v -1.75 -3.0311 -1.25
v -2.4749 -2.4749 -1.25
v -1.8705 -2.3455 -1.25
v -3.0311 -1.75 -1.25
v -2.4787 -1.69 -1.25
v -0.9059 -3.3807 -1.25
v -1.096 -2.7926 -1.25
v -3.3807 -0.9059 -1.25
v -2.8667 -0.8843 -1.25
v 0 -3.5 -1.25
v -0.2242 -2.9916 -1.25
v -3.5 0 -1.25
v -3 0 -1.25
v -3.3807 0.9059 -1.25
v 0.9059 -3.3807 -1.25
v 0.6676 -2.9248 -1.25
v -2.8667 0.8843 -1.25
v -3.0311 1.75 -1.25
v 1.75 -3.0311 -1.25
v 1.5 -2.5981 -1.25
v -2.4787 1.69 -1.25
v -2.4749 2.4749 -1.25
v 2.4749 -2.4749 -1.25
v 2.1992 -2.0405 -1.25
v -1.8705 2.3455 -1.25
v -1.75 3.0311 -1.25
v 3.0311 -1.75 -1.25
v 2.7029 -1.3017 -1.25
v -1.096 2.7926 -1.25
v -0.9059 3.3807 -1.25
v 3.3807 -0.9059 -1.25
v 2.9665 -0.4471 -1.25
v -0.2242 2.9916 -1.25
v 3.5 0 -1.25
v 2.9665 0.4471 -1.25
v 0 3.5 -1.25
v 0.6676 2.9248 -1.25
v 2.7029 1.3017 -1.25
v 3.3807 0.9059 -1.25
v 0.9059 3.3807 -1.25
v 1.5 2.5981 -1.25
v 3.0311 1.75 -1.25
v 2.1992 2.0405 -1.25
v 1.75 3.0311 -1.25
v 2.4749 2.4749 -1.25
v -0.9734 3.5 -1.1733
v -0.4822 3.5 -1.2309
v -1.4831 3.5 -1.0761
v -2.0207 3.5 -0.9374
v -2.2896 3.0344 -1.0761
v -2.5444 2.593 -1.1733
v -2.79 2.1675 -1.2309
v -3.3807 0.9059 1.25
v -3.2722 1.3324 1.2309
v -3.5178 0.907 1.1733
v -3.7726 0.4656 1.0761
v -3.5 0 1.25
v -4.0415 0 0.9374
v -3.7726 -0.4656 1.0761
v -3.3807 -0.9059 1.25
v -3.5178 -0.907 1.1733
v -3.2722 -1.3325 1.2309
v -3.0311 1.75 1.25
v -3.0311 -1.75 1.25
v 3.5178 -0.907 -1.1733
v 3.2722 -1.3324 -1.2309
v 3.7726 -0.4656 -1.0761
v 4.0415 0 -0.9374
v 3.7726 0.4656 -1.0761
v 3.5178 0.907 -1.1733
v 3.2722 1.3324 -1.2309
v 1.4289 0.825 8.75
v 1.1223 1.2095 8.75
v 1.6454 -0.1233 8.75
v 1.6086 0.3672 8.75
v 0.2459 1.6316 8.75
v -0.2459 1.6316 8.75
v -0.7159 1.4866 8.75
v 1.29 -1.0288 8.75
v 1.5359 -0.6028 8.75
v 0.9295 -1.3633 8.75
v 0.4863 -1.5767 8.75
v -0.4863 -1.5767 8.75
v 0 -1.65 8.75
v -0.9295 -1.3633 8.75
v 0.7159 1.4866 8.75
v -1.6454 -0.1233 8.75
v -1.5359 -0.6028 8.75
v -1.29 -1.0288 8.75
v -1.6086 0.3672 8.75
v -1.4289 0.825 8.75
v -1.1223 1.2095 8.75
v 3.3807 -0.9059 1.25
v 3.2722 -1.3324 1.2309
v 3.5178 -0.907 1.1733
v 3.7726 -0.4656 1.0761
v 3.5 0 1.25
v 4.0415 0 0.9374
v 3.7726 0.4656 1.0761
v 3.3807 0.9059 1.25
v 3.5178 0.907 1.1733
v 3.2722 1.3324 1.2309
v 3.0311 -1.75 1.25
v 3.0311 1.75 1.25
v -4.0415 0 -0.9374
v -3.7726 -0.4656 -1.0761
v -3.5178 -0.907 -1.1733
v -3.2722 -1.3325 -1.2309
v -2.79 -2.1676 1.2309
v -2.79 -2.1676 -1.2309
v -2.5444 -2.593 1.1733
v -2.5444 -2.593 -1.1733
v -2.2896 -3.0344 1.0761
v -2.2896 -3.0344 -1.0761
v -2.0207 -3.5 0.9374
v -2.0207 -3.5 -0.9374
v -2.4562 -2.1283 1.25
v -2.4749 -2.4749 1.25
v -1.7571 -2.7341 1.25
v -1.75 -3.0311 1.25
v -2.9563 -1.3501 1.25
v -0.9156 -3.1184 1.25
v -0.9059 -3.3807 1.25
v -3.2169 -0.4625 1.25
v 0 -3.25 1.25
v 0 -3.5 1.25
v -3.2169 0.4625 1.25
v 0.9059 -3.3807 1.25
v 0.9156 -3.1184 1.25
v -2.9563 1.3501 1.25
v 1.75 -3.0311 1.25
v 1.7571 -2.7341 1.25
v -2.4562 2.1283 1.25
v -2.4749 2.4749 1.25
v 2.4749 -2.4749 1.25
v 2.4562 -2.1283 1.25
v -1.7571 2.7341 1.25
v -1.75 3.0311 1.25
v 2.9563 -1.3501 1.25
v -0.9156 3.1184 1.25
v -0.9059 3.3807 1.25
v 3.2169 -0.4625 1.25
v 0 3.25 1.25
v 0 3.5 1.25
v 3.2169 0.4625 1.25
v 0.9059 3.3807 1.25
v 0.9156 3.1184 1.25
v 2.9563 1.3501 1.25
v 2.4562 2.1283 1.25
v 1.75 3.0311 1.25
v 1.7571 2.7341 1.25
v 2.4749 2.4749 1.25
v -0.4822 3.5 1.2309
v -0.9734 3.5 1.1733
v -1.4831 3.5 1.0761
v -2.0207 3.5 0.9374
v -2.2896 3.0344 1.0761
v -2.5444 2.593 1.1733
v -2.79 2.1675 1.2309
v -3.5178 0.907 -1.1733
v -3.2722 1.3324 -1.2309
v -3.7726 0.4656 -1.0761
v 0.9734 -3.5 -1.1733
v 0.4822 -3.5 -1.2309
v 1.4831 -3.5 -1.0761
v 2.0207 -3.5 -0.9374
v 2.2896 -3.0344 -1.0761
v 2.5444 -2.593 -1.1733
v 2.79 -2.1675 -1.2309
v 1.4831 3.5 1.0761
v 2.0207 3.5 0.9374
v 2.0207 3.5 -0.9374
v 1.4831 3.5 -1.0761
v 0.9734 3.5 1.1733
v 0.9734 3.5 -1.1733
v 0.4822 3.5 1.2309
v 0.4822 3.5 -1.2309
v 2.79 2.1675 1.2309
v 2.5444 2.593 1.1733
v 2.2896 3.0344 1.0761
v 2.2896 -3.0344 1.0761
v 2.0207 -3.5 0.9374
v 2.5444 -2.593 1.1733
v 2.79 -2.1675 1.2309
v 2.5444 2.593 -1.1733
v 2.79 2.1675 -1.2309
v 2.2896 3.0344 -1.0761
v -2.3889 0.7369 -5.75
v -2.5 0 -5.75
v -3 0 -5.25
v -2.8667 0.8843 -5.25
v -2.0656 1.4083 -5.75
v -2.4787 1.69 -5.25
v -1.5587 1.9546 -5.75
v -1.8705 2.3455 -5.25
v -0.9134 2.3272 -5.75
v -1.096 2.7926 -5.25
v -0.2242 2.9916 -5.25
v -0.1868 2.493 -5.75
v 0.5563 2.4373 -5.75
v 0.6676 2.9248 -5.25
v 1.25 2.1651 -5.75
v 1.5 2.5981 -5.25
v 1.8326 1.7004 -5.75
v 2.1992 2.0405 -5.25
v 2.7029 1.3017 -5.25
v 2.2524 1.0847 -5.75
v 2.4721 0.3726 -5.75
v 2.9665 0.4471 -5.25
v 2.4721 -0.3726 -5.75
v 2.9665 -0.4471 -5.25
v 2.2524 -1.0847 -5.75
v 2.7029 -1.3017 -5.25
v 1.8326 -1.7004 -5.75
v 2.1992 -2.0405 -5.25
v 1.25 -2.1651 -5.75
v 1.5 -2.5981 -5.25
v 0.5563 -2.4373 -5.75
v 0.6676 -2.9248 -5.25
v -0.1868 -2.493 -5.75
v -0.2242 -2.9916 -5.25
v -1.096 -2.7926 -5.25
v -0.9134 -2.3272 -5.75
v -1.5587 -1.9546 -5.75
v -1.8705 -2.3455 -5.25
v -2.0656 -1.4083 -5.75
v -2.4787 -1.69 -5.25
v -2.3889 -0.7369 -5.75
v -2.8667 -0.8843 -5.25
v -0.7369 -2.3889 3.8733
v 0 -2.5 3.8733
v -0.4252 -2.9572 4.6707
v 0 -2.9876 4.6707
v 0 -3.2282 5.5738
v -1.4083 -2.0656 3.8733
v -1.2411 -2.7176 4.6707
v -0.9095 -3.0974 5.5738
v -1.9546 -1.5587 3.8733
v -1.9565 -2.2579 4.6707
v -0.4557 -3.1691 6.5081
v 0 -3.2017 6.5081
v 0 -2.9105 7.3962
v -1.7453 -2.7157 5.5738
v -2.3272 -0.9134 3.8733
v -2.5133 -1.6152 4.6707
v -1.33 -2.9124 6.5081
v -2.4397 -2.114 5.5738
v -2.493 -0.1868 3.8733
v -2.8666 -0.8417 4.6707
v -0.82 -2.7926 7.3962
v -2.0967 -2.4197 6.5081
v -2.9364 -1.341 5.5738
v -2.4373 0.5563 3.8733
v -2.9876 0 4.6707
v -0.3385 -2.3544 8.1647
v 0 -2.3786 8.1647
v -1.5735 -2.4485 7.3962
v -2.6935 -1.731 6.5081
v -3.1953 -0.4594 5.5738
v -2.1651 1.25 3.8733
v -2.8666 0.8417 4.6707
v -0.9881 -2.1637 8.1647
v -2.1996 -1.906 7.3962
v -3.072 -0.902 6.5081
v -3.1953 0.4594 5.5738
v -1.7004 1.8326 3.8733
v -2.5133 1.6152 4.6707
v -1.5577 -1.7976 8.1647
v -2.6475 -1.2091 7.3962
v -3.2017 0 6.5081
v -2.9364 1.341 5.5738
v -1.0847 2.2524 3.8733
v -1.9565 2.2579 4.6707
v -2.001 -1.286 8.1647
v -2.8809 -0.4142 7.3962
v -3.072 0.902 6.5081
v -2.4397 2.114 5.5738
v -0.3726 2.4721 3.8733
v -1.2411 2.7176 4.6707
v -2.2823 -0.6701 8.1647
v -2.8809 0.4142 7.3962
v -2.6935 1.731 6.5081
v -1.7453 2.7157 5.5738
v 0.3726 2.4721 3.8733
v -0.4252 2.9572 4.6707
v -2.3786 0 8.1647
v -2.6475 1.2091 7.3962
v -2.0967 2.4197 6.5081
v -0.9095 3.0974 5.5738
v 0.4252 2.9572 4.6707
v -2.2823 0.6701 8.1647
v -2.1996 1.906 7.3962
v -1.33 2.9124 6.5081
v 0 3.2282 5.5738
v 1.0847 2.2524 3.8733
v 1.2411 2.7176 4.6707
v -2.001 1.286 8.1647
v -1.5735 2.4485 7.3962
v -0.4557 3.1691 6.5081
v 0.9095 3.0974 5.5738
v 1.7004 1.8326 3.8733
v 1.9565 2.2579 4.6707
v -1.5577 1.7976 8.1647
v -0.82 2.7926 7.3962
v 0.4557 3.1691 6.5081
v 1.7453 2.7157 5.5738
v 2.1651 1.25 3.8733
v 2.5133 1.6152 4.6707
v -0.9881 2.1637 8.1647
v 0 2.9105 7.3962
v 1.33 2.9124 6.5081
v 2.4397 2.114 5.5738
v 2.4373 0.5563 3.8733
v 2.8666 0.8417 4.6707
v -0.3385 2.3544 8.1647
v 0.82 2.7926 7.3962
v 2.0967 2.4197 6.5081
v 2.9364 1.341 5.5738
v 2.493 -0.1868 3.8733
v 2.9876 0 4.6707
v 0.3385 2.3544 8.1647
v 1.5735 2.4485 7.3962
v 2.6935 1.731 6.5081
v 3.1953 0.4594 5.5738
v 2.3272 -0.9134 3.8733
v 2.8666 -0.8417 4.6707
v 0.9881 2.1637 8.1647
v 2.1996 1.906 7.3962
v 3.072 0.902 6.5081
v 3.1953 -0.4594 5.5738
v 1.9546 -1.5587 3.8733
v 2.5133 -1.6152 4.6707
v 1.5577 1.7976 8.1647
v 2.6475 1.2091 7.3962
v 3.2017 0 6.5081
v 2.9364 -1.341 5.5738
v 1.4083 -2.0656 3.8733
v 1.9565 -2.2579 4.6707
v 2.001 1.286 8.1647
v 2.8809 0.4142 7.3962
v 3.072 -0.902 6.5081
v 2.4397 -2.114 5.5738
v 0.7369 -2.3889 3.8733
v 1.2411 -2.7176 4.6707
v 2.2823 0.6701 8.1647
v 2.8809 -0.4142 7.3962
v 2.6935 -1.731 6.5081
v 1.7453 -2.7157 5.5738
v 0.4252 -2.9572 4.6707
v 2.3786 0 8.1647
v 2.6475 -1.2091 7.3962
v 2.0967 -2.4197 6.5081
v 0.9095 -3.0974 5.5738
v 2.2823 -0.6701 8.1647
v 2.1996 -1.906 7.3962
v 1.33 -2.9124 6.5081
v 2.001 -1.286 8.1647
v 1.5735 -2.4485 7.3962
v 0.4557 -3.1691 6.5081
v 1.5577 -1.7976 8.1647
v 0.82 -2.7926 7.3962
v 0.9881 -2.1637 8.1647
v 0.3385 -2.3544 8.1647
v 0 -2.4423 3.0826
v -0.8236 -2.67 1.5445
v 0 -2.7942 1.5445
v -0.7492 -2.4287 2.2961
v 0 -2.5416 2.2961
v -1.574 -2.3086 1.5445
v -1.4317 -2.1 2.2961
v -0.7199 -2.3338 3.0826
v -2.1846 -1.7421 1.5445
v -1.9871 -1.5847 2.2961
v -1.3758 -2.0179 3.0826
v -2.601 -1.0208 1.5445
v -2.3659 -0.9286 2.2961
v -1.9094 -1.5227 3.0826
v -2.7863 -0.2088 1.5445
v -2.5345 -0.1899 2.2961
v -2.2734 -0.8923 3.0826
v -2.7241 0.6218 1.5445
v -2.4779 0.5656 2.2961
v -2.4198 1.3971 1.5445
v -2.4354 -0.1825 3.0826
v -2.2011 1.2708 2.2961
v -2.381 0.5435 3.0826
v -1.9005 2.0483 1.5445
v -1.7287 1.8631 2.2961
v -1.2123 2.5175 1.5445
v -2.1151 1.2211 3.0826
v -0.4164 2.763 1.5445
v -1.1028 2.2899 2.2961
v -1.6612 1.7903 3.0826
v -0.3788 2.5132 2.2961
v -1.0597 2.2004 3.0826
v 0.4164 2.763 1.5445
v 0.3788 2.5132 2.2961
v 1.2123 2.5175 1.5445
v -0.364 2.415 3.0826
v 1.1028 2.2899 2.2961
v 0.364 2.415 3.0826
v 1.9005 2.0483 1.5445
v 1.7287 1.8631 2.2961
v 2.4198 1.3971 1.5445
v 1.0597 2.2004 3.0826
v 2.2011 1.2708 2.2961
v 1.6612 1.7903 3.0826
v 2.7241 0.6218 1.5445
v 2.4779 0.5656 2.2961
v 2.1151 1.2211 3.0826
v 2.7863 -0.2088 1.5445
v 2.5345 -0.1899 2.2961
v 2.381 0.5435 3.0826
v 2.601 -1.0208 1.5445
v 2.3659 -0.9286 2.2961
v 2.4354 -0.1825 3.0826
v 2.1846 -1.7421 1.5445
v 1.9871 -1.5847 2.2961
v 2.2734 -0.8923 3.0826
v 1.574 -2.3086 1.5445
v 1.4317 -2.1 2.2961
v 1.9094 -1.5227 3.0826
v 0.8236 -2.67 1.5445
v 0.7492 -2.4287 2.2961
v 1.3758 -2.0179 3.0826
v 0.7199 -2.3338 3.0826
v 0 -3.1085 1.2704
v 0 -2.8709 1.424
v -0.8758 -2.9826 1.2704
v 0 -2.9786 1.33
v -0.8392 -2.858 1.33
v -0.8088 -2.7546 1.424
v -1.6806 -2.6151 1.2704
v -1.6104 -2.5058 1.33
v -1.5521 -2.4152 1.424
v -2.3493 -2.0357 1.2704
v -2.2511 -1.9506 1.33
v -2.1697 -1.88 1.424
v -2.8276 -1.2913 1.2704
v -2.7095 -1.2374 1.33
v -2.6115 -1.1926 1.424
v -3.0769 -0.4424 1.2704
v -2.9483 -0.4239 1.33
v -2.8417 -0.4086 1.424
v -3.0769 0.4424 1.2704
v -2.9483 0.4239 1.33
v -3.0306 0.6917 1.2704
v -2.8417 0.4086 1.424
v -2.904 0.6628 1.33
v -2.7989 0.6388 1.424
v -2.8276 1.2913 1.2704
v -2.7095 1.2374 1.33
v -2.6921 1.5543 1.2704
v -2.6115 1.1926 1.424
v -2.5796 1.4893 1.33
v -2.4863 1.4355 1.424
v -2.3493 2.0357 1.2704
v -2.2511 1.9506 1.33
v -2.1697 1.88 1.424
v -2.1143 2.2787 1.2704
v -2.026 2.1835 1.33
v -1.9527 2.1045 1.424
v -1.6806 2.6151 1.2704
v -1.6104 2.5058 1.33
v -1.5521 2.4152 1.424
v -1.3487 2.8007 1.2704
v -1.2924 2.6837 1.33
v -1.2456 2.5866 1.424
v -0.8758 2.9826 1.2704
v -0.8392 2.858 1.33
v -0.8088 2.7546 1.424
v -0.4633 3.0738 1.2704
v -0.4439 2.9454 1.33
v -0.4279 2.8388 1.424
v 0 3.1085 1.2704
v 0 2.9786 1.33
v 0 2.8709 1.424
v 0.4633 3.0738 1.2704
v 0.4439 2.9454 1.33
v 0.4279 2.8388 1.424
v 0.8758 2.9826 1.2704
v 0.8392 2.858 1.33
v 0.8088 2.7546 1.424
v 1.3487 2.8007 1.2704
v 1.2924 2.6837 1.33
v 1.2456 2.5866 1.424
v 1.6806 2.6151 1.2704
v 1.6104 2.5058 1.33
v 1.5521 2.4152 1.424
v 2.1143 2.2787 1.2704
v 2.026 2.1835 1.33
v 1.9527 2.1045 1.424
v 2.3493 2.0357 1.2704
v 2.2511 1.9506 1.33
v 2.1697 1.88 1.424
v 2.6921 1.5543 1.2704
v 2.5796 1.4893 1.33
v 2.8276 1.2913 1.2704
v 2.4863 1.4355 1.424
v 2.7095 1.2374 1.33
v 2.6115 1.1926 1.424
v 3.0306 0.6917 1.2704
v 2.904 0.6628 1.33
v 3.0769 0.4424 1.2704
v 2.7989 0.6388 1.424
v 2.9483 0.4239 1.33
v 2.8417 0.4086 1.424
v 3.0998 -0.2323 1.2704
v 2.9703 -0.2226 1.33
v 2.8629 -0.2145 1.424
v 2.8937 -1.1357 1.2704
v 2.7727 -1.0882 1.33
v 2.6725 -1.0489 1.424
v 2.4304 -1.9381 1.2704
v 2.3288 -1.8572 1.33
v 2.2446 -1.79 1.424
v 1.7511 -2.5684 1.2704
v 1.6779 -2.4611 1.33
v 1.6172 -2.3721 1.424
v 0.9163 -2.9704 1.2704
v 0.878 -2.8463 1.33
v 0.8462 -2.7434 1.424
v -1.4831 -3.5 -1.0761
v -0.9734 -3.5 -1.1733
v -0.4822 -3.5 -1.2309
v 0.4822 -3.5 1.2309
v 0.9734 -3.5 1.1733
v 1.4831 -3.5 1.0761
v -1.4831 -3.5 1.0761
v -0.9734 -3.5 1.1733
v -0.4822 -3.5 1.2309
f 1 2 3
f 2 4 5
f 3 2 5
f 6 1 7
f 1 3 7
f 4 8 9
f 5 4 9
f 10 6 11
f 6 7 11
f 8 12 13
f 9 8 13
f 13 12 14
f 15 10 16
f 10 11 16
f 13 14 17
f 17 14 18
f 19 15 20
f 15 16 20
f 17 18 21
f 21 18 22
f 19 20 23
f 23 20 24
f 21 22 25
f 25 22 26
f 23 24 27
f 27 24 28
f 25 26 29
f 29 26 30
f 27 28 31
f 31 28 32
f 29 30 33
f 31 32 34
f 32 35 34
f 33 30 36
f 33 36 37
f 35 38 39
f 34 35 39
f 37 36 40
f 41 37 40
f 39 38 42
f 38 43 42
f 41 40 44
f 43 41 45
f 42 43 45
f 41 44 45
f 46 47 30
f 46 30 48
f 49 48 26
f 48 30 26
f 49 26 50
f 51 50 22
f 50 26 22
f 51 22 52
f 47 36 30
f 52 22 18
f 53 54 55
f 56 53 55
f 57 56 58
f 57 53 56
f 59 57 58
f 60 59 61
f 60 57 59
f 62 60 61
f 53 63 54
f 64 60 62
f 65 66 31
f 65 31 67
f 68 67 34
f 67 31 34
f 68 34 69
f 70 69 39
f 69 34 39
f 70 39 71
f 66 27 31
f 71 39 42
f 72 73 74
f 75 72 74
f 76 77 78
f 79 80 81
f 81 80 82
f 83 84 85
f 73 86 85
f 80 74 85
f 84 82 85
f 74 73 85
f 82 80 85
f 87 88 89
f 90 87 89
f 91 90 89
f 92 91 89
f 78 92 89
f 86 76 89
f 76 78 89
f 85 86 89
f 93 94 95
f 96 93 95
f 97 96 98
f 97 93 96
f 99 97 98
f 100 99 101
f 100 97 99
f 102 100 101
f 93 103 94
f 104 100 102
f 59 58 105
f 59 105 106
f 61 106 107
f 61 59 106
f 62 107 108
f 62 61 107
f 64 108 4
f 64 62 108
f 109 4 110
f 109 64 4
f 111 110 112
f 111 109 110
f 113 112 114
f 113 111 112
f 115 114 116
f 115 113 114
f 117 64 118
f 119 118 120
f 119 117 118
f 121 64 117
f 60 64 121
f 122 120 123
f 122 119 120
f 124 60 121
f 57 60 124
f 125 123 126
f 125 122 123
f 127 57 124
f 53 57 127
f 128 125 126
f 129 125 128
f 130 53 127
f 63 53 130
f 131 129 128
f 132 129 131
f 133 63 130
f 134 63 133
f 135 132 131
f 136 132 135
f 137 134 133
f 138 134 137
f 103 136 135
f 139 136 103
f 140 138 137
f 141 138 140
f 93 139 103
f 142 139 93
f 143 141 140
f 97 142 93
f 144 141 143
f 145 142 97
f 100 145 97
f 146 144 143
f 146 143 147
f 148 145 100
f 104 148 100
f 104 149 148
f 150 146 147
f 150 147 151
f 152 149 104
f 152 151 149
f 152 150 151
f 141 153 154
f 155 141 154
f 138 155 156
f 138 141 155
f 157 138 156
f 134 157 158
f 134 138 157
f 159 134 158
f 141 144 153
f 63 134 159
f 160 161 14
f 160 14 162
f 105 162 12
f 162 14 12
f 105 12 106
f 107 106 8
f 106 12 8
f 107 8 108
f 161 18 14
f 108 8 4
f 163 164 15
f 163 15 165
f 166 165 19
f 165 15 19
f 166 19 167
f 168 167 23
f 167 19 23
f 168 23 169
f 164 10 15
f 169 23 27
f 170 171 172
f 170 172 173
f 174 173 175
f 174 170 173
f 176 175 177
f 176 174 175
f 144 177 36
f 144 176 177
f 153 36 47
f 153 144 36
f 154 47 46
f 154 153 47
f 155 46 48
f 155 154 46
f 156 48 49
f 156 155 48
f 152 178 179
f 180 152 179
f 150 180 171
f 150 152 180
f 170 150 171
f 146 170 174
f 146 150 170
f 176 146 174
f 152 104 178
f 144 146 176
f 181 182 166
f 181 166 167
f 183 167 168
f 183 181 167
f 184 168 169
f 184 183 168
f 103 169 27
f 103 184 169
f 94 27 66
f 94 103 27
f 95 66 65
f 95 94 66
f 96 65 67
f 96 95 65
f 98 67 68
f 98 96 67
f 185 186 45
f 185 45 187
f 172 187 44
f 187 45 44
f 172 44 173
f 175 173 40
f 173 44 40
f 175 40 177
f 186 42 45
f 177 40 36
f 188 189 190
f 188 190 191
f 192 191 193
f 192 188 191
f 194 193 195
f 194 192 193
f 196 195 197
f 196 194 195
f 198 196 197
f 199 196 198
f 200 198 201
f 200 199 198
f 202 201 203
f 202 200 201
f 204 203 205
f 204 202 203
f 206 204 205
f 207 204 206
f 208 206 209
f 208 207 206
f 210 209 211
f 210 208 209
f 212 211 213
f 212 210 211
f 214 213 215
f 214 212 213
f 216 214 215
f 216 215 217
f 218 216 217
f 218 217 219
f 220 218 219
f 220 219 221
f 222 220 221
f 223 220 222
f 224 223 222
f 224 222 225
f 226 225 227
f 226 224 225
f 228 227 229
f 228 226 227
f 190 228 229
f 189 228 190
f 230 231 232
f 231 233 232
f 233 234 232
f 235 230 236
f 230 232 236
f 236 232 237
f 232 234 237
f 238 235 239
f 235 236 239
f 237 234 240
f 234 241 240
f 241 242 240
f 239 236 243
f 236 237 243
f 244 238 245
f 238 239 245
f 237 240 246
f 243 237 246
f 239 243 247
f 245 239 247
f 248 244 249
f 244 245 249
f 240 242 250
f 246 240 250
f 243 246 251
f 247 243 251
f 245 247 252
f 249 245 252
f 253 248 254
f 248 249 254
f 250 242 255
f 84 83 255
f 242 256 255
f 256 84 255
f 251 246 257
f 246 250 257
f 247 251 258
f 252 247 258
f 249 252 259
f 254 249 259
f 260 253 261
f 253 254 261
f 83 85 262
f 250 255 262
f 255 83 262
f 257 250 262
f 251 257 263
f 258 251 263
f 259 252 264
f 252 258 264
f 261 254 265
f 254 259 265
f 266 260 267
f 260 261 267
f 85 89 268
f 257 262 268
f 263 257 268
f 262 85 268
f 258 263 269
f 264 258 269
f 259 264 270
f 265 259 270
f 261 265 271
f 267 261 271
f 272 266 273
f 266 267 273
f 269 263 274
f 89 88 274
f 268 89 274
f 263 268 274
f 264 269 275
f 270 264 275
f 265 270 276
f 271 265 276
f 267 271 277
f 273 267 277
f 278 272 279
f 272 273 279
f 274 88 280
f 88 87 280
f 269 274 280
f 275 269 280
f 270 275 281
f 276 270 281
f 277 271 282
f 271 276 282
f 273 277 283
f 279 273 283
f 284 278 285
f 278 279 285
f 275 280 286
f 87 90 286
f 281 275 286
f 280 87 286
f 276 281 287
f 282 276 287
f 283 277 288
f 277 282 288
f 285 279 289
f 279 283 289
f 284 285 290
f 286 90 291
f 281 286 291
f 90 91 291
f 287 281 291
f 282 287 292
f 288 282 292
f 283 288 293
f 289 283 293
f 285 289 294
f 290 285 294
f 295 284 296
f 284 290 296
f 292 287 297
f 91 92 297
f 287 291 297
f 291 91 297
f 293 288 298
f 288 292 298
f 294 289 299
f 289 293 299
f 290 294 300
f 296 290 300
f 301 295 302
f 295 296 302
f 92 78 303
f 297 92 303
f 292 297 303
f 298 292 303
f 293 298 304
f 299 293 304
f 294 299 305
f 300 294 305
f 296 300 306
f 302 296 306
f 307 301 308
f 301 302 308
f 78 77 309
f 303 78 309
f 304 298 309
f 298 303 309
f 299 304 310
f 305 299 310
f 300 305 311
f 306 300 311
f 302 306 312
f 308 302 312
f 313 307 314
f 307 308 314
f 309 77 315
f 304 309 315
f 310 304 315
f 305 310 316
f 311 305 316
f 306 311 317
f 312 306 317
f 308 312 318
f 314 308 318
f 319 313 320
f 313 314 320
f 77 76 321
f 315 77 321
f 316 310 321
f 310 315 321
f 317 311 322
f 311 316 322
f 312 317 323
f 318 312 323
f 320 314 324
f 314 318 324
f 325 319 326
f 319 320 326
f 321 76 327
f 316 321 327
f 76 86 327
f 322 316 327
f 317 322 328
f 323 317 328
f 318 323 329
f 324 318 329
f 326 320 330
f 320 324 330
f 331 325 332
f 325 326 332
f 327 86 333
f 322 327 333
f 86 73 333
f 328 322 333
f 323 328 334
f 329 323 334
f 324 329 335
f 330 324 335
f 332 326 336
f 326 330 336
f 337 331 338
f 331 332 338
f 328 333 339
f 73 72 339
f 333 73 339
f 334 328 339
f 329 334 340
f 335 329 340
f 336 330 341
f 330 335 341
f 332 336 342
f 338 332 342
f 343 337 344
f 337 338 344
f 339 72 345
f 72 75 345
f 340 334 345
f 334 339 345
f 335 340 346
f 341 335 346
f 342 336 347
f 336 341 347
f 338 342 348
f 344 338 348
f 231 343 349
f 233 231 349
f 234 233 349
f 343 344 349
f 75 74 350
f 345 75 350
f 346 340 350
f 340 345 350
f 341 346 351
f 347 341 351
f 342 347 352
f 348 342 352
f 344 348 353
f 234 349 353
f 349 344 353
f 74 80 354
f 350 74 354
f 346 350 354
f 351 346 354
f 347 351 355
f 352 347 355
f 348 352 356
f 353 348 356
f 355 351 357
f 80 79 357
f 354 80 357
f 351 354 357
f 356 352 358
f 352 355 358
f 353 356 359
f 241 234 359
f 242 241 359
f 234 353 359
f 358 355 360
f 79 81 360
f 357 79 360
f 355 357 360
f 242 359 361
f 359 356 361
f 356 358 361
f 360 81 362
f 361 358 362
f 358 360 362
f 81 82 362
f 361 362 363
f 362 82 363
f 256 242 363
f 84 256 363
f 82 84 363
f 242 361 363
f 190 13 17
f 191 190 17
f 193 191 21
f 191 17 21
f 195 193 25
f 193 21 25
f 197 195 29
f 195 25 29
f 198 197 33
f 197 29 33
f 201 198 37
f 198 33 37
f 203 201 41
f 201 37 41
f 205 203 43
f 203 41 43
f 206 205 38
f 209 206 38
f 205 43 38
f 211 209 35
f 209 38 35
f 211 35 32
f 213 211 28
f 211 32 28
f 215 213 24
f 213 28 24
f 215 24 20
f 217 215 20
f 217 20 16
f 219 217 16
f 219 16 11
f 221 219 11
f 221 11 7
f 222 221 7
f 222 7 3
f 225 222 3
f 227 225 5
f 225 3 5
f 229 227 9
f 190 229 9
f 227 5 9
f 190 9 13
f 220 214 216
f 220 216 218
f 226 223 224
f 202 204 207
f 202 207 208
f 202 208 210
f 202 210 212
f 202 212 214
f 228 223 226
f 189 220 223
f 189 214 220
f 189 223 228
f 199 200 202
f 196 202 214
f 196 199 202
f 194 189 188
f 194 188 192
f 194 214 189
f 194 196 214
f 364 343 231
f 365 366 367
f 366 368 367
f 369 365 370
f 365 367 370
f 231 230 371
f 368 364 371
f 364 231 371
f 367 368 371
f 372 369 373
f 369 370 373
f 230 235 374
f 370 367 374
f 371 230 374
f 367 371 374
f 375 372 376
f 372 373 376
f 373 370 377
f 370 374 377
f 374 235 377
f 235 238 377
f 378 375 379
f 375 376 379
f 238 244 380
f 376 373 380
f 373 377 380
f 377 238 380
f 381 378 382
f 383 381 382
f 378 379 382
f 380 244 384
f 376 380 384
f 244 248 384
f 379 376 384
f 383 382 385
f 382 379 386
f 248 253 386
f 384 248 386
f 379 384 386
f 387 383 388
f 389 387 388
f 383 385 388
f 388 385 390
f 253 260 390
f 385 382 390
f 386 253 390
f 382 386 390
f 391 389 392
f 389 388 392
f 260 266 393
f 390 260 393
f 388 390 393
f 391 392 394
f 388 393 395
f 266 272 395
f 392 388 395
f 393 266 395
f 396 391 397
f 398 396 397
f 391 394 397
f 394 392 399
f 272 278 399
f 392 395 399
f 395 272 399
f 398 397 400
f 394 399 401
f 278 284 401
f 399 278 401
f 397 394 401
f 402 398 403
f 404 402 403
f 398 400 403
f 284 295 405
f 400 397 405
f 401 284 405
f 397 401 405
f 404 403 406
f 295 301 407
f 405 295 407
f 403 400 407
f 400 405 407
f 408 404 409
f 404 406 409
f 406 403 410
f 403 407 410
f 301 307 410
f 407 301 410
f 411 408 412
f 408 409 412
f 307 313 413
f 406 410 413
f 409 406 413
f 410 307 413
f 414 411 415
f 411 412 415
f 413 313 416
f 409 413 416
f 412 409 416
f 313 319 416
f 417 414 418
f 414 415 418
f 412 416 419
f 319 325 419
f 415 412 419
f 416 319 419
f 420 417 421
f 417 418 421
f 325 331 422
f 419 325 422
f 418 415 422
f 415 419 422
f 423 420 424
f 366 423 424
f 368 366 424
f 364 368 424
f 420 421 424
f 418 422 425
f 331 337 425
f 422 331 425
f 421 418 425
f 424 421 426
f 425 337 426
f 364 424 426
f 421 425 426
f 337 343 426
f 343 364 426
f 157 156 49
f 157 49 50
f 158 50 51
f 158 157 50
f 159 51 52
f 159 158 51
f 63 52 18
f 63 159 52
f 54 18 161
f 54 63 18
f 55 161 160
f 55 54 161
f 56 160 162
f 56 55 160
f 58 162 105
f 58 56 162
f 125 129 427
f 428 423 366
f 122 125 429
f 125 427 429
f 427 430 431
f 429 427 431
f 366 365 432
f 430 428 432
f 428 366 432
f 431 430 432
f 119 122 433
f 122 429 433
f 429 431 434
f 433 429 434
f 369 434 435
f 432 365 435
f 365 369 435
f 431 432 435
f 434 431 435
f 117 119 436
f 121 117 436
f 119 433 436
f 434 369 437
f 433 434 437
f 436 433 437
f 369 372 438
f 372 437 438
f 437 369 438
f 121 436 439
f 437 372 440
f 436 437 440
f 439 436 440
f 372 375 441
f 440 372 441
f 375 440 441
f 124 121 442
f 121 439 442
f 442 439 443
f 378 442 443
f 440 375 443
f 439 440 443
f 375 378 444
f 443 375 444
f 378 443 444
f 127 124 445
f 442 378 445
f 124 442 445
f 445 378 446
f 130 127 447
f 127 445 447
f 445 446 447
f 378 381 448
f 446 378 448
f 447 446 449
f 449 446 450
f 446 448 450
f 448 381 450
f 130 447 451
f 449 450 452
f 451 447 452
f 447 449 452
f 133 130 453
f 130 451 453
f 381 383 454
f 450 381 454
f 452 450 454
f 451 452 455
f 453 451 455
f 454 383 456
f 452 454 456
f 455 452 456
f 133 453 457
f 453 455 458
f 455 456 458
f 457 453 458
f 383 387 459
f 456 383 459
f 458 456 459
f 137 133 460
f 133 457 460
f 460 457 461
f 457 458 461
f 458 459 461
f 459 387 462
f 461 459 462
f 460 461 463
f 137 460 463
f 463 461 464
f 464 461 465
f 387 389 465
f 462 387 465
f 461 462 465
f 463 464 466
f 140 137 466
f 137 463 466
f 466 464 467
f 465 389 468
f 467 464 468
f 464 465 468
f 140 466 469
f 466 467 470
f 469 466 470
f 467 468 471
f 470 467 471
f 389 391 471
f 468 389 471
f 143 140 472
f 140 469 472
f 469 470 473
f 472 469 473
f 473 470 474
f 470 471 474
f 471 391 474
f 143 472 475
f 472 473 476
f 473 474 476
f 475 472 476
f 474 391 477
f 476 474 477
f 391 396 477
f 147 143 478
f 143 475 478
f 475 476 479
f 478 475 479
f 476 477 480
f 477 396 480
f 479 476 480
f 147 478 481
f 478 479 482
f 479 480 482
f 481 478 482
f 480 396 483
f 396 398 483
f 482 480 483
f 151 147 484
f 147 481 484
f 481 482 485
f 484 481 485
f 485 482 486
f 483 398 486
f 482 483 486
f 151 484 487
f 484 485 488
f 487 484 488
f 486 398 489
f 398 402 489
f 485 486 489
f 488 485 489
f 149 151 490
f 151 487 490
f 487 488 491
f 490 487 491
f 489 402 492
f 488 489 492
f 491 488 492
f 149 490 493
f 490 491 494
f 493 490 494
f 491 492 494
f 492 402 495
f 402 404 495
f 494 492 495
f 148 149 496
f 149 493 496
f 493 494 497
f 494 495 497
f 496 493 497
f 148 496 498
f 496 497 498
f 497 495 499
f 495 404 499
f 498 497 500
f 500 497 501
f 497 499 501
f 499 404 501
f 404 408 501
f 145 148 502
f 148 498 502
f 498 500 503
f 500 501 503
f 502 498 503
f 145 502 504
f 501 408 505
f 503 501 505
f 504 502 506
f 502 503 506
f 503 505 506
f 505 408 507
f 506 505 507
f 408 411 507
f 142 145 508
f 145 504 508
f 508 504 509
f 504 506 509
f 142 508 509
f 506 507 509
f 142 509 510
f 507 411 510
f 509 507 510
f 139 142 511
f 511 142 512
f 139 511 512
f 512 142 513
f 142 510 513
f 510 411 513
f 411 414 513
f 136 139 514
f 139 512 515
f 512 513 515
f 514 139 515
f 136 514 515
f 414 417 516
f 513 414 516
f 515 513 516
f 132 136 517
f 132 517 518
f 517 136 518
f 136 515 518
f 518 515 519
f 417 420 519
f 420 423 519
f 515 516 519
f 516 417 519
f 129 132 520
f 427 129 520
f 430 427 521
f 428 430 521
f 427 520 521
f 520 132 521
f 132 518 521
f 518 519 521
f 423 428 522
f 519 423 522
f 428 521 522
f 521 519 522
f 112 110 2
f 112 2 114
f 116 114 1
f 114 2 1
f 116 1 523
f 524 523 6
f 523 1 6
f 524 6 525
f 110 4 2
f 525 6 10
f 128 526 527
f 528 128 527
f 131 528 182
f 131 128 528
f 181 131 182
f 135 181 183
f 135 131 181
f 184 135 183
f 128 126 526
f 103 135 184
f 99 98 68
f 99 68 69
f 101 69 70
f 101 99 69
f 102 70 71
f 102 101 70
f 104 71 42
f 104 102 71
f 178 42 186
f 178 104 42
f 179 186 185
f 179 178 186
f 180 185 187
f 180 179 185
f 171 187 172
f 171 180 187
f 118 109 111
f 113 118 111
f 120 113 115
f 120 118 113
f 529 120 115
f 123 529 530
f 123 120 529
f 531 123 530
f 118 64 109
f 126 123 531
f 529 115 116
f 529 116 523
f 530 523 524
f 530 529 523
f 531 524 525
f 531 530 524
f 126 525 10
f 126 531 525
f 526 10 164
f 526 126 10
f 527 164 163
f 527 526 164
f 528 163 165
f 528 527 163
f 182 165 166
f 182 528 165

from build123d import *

# Parameters (mm, degrees)
VYSUNOUT1_DEPTH = 1.25
SKICA4_R        = 3
VYSUNOUT2_DEPTH = 4.5
ZKOSIT1_SIZE    = 0.5


with BuildPart() as part:
    # Skica1 → Vysunout1 (new, symmetric)
    with BuildSketch(Plane.XY):
        Polygon((4.041451884, 0), (2.020725942, 3.5), (-2.020725942, 3.5), (-4.041451884, 0), (-2.020725942, -3.5), (2.020725942, -3.5), align=None)
    extrude(amount=VYSUNOUT1_DEPTH, both=True)

    # Skica2 → Odebrat otočením1 (revolve, cut)
    with BuildSketch(Plane(origin=(0, 0, 0), x_dir=(0, 0, -1), z_dir=(1, 0, 0))):
        Polygon((-1.25, 3.5), (-1.25, 5.142284655), (-0.301826512, 5.142284655), align=None)
    odebrat_oto_en_m1 = revolve(axis=Axis((0, 0, 1.25), (0, 0, 1)), mode=Mode.SUBTRACT)

    # Zrcadlit1: Odebrat otočením1 across plane
    add(odebrat_oto_en_m1.mirror(Plane.XY), mode=Mode.SUBTRACT)

    # Skica3 → Otočit kolem osy1 (revolve)
    with BuildSketch(Plane(origin=(0, 0, 0), x_dir=(0, 0, -1), z_dir=(1, 0, 0)), mode=Mode.PRIVATE) as oto_it_kolem_osy1_sk:
        with BuildLine():
            Line((-8.75, 1.65), (-8.75, 0))
            Line((-8.75, 0), (-1.25, 0))
            Line((-1.25, 0), (-1.25, 3.25))
            ThreePointArc((-1.25, 3.25), (-1.33004432, 2.978638199), (-1.544548907, 2.794160282))
            ThreePointArc((-1.544548907, 2.794160282), (-2.686883352, 2.472411814), (-3.873344034, 2.5))
            ThreePointArc((-3.873344034, 2.5), (-6.508060613, 3.201728963), (-8.75, 1.65))
        make_face()
    revolve(oto_it_kolem_osy1_sk.sketch.rotate(Axis((0, 0, 1.25), (0, 0, -1)), 180), axis=Axis((0, 0, 1.25), (0, 0, -1)))

    # Skica4 → Vysunout2 (add)
    with BuildSketch(Plane(origin=(0, 0, -1.25), x_dir=(-1, 0, 0), z_dir=(0, 0, -1))):
        Circle(SKICA4_R)
    extrude(amount=VYSUNOUT2_DEPTH)

    # Zkosit1
    zkosit1_edges = [part.edges().sort_by_distance(p)[0] for p in [
        (3, 0, -5.75),
    ]]
    chamfer(zkosit1_edges, length=ZKOSIT1_SIZE)


solid = part.part
